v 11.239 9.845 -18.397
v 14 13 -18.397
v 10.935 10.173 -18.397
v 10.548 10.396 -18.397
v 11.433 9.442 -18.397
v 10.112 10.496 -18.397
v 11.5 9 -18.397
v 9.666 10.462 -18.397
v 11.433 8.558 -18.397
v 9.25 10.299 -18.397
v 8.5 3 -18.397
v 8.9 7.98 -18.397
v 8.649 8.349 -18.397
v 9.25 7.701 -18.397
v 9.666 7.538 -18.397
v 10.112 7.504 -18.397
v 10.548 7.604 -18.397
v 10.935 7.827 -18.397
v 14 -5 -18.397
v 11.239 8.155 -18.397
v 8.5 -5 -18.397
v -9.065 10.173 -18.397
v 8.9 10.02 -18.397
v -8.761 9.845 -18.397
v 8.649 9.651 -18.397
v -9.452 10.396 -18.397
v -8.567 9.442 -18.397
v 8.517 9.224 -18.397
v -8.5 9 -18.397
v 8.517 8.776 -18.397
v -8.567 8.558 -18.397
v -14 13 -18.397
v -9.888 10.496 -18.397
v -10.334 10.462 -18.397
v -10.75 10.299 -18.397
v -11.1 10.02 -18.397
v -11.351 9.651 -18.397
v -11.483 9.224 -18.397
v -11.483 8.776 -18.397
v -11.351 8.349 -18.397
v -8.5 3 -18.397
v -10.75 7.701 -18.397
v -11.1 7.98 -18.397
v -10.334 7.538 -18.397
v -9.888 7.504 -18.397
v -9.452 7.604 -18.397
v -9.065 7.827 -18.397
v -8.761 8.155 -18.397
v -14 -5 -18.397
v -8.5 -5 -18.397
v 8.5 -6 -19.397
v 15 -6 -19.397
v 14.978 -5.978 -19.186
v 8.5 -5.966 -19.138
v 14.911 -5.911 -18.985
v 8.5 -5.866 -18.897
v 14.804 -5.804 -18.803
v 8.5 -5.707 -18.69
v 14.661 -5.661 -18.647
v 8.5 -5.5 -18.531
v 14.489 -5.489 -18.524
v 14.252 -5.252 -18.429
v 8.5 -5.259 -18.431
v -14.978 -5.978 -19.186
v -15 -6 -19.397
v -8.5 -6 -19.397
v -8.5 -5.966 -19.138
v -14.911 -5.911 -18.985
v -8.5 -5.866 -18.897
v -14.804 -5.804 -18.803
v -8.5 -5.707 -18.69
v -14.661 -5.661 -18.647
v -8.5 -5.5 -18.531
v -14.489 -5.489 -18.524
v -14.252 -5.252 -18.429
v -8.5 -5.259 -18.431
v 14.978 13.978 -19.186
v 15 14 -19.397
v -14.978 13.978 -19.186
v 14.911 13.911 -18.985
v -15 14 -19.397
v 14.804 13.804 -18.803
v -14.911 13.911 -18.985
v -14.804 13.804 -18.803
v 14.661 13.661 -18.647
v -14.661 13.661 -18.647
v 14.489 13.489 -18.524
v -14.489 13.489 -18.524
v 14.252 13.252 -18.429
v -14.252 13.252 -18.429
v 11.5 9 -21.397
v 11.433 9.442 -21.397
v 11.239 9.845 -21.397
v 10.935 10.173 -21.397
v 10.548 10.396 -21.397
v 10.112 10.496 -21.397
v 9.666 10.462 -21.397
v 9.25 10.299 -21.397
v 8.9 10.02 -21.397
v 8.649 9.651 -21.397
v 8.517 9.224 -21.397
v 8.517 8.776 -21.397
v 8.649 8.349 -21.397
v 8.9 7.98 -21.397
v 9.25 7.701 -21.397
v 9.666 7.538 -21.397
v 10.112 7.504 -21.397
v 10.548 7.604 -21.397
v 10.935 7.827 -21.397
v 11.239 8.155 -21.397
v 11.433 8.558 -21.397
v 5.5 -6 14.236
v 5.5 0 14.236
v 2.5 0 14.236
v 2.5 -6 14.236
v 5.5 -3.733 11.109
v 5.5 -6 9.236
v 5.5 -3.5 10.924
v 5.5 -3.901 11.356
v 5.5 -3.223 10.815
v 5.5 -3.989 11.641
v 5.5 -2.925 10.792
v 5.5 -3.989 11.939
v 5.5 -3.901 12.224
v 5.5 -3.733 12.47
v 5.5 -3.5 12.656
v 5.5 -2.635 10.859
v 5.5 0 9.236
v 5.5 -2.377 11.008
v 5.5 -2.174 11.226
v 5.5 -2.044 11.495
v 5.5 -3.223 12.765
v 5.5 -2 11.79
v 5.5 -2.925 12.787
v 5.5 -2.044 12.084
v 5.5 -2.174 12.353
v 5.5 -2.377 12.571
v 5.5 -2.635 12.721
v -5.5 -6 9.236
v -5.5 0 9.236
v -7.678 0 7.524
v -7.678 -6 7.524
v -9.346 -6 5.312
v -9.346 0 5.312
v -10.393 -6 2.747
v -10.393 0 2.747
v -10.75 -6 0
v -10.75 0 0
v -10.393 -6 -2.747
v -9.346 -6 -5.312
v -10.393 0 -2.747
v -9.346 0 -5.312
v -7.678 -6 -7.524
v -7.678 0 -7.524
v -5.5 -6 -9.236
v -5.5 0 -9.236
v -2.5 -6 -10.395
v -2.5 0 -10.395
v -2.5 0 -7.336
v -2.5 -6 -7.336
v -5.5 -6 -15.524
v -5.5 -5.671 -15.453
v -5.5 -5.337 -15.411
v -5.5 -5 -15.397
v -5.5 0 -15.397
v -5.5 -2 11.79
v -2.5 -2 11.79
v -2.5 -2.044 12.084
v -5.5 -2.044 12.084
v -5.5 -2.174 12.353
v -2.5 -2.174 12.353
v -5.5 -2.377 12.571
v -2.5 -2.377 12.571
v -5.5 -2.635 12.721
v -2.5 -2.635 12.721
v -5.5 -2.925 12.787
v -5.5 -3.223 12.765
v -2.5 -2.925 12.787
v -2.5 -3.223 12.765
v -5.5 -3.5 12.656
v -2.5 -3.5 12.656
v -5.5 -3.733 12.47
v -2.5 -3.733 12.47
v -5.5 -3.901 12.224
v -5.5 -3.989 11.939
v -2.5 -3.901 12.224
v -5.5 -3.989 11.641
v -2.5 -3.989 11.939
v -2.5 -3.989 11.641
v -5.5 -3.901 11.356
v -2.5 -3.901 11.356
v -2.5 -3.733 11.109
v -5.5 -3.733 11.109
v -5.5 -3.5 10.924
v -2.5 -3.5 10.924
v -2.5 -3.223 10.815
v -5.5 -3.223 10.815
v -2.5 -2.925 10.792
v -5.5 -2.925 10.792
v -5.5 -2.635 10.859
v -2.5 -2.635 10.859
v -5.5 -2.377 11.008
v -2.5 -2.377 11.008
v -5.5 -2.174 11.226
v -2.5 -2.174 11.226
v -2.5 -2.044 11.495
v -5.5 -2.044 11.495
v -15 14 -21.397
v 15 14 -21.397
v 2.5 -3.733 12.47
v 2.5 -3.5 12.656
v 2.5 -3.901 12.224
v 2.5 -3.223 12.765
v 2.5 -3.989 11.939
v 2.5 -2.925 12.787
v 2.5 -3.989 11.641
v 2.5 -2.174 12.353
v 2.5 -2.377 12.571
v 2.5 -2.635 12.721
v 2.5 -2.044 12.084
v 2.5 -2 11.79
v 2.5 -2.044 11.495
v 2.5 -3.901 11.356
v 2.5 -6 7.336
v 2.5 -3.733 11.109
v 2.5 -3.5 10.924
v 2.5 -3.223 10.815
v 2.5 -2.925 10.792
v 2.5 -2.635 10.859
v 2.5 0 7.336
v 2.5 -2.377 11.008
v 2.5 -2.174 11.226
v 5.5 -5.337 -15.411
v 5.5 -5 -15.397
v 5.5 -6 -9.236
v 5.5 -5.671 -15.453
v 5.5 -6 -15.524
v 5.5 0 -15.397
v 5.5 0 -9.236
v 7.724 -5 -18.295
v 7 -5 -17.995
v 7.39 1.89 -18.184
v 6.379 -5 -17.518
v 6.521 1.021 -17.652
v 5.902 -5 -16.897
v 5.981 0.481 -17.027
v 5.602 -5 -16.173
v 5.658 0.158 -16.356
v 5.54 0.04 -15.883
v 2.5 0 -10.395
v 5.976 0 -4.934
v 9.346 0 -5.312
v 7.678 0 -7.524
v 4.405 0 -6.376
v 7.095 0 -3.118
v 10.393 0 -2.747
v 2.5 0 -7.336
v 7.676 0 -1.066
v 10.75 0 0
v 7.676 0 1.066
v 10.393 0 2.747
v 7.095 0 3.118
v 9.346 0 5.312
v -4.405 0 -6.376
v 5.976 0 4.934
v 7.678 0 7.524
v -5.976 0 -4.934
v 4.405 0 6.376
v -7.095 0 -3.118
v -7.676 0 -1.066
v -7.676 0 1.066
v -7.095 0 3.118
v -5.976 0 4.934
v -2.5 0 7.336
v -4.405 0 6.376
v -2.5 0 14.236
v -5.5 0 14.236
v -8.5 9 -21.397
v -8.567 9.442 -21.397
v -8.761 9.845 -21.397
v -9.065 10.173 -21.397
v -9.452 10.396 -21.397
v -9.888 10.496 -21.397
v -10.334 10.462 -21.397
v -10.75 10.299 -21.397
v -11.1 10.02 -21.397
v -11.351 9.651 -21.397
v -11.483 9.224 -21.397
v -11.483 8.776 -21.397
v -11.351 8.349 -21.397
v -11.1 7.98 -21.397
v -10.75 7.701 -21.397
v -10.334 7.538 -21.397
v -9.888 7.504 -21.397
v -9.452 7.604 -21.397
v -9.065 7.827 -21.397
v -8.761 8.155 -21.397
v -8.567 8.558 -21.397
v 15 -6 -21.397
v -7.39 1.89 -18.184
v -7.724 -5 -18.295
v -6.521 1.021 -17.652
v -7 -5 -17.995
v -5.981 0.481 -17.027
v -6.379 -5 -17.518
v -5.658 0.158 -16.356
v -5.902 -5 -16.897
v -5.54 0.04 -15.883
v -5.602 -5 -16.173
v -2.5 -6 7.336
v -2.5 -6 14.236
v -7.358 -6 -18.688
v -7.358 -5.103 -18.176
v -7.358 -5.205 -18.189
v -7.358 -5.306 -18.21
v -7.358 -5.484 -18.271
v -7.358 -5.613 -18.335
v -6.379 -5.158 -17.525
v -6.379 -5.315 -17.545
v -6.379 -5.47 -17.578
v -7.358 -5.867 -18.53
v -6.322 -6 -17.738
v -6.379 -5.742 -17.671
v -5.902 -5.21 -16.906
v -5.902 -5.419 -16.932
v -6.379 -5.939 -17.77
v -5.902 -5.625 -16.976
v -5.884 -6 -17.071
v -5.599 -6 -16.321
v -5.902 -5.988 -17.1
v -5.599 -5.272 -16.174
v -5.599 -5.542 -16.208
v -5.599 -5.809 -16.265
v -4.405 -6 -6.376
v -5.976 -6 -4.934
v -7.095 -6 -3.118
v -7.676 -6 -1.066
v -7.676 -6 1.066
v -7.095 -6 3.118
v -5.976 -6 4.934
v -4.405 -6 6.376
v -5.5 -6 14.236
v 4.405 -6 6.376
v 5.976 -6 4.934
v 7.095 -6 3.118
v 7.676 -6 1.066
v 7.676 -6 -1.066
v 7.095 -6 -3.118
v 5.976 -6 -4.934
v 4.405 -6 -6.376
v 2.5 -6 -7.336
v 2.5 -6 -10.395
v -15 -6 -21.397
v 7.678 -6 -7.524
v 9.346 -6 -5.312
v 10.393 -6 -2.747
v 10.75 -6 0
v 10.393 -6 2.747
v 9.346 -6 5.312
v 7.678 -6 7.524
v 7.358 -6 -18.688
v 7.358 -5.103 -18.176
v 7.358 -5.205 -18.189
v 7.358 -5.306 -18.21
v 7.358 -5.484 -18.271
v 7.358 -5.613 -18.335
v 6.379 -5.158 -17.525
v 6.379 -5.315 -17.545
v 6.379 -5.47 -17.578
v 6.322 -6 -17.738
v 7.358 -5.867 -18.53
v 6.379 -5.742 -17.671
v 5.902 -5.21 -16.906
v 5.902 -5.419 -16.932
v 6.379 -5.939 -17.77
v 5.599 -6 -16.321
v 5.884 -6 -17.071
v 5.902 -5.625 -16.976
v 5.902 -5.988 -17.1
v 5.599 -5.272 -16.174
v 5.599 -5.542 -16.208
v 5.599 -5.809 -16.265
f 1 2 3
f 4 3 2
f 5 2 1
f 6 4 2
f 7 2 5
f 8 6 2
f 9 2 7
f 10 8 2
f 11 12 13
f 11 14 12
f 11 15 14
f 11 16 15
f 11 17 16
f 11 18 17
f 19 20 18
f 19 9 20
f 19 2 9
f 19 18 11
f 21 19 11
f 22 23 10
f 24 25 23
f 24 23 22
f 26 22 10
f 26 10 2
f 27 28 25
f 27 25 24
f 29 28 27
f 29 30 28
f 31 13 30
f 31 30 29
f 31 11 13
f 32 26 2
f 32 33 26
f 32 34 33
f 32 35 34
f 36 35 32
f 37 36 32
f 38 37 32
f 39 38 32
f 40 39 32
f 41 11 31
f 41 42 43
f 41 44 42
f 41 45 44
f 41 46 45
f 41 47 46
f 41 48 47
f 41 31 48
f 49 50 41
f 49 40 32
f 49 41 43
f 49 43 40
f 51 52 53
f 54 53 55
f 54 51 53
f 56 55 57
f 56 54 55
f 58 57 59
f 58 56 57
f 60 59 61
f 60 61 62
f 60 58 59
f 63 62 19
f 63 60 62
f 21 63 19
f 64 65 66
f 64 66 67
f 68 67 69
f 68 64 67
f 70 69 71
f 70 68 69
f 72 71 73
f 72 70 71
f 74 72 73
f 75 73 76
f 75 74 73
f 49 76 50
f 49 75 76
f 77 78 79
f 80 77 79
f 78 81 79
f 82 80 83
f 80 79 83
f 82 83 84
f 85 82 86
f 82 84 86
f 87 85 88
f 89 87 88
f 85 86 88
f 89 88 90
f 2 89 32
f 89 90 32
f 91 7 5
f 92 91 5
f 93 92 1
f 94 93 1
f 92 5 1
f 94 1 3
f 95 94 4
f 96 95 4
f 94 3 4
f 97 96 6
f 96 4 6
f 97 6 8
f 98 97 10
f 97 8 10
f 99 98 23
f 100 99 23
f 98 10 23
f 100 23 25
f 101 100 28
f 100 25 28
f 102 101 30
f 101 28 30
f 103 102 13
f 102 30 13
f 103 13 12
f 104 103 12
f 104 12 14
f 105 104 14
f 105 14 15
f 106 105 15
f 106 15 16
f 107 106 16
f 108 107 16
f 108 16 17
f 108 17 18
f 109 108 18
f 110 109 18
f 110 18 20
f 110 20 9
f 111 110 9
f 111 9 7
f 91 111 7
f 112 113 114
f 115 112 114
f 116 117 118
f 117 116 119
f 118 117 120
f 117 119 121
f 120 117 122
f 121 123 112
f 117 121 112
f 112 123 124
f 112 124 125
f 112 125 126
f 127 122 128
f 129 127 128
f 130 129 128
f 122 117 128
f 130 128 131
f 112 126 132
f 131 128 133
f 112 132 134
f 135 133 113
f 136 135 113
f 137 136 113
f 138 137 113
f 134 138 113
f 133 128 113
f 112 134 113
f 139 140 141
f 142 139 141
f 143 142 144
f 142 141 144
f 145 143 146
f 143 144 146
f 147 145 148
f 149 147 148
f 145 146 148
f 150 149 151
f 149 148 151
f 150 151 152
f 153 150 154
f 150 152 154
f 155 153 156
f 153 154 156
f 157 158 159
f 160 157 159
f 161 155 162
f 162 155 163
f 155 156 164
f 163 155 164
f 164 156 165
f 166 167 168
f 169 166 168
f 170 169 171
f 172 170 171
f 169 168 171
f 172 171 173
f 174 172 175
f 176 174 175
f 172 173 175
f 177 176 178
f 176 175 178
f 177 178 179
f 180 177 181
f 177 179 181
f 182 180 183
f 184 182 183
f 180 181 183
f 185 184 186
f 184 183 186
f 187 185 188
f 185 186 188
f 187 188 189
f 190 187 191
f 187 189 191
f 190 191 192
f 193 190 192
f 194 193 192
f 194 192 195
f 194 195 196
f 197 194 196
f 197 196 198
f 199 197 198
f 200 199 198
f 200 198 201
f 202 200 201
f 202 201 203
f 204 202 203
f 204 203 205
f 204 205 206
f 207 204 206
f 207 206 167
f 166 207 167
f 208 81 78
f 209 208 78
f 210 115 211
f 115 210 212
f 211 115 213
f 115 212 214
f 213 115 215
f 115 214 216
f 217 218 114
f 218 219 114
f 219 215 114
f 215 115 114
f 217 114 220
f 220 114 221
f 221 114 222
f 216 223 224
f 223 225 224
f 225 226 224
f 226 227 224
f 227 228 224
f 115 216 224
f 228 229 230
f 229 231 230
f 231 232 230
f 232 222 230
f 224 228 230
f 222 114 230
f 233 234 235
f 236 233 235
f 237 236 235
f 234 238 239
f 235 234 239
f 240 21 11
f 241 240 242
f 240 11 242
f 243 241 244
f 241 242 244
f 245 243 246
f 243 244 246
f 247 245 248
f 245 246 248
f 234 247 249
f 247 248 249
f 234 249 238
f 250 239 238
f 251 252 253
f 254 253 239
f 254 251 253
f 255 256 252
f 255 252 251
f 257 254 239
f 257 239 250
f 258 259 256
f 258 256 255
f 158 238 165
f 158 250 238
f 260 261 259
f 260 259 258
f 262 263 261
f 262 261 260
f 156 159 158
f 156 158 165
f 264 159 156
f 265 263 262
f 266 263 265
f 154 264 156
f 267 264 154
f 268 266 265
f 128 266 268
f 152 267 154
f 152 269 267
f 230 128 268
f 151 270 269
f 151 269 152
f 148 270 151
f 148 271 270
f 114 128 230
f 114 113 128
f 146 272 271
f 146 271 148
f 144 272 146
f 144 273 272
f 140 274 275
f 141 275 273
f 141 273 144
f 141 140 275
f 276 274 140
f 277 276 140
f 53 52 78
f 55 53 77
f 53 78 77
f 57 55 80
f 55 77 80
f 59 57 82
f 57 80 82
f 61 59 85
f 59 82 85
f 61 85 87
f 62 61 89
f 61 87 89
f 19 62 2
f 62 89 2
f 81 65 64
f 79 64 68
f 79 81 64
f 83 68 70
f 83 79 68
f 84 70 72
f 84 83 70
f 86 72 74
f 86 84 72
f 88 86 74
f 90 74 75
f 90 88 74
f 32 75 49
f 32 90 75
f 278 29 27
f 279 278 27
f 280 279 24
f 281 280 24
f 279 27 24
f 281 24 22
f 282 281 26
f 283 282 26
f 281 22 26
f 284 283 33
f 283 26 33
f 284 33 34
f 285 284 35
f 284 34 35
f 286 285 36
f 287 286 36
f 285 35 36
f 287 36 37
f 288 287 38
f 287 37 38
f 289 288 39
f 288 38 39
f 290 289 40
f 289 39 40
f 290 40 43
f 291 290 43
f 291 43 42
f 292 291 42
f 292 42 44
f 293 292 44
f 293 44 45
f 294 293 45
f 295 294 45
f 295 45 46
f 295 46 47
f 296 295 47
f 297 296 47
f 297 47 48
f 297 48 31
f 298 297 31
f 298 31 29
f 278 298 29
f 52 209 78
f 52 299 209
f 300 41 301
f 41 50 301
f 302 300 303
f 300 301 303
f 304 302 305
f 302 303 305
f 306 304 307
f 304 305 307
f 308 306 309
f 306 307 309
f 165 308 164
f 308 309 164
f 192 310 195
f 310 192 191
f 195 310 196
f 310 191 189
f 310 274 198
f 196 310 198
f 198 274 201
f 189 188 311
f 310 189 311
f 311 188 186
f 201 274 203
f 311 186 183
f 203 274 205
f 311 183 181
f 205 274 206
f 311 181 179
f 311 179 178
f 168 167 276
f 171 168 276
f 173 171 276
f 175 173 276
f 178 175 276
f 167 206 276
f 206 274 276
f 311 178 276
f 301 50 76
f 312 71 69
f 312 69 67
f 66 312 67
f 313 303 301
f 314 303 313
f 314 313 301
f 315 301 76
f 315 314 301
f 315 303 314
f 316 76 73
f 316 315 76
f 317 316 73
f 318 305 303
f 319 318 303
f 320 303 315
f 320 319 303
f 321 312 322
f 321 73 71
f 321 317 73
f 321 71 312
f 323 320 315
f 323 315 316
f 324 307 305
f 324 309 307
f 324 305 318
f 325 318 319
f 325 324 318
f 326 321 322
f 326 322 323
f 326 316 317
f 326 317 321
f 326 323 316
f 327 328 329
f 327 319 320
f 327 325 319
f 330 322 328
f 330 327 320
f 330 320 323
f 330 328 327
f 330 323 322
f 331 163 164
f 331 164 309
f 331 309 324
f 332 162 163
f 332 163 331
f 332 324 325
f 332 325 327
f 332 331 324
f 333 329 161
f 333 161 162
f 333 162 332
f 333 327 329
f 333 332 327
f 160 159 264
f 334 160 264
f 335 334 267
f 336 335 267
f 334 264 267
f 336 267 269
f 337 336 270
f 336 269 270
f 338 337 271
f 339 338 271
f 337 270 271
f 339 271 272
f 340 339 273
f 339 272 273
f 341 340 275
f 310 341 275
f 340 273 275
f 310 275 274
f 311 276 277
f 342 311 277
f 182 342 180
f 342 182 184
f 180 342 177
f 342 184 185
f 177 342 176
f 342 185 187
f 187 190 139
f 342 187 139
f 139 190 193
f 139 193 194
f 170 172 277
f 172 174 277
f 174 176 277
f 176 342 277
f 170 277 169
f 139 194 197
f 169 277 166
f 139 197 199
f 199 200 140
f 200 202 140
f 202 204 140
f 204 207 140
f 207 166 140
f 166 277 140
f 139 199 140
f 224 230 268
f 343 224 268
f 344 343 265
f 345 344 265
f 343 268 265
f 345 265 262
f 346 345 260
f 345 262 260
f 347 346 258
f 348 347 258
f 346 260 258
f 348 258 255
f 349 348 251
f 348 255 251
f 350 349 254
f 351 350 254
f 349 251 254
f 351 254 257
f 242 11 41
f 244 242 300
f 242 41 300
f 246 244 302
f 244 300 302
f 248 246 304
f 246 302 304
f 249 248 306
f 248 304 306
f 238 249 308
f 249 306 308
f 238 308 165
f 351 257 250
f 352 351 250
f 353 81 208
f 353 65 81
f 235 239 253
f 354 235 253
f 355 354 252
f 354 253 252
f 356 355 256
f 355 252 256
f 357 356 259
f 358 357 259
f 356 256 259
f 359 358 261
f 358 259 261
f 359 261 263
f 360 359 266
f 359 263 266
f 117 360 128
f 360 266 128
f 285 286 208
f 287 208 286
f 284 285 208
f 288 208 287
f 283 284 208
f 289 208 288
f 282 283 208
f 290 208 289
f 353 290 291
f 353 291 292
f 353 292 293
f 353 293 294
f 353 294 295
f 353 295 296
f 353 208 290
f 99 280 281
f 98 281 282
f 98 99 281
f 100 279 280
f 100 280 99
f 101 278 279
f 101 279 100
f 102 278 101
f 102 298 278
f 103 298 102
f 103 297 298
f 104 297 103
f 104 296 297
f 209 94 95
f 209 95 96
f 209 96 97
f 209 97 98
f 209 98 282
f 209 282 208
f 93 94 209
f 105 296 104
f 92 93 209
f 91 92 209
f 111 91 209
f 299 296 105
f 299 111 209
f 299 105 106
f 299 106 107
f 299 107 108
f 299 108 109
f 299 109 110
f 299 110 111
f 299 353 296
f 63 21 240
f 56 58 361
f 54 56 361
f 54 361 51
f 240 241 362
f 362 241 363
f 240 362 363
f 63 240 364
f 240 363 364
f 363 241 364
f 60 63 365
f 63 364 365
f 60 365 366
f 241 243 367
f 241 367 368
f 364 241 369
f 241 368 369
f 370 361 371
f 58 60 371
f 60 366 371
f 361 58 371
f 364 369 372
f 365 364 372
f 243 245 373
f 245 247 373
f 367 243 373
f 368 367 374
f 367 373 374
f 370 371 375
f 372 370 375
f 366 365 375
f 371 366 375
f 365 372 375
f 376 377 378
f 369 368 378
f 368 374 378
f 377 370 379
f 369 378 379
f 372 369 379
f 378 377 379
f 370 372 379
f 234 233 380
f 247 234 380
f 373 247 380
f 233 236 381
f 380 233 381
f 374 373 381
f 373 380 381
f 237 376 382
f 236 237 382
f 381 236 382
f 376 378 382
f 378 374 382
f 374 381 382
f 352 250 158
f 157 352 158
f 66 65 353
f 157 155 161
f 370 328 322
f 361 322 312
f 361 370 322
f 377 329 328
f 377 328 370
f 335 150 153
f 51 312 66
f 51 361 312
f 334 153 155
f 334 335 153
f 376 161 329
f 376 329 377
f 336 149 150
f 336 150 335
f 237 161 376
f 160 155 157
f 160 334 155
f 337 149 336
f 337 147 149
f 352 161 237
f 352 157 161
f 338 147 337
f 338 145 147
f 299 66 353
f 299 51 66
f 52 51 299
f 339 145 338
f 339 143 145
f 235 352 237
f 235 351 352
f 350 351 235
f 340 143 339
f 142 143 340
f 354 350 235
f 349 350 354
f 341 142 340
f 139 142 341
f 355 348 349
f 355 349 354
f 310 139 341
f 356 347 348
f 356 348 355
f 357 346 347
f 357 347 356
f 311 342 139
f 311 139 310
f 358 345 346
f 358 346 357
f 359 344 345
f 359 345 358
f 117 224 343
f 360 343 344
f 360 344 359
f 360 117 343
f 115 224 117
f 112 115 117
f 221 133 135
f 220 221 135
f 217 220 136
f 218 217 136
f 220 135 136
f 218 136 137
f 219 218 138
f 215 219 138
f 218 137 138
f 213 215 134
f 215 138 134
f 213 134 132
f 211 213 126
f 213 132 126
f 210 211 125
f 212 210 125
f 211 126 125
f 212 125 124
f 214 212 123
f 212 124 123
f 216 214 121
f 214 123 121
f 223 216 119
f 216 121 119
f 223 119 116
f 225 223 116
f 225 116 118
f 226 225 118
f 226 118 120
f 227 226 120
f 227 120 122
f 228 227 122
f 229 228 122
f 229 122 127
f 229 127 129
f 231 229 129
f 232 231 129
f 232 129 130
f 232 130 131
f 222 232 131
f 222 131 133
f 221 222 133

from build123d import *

# Parameters (mm, degrees)
F1_DEPTH      = 6
F2_R          = 1
F3_DEPTH      = 25
F5_DEPTH      = 6
F6_DEPTH      = 10
F11_R         = 1
F12_T1_DEPTH  = 5
F12_T3_DEPTH  = 11
F12_T8_ANGLE  = 359.64
F12_T14_ANGLE = 359.64
F12_T21_DEPTH = 12.5
F12_T25_DEPTH = 18.5
F12_T32_DEPTH = 18.5
F12_T36_DEPTH = 12.5
F13_R         = 1.5
F14_DEPTH     = 25


# Not quite as in the source:
# - a fillet or chamfer that OpenCascade refuses, or shapes differently, is made with other operations: its cross-section is extruded or revolved along the edge and cut away or added


with BuildPart() as f1:
    # F0 (on Front) → F1 (new body)
    with BuildSketch(Plane.XZ):
        with BuildLine():
            Line((2.5, -7.3357003756), (2.5, -18.4552618332))
            Line((2.5, -18.4552618332), (5.5, -18.4552618332))
            Line((5.5, -18.4552618332), (5.5, -9.236476601))
            ThreePointArc((5.5, -9.236476601), (10.75, 0), (5.5, 9.236476601))
            Line((5.5, 9.236476601), (5.5, 14.236476601))
            Line((5.5, 14.236476601), (2.5, 14.236476601))
            Line((2.5, 14.236476601), (2.5, 7.3357003756))
            ThreePointArc((2.5, 7.3357003756), (7.75, 0), (2.5, -7.3357003756))
        make_face()
    extrude(amount=F1_DEPTH)


with BuildPart() as f1b:
    # F0 (on Front) → F1, piece 2 (new body)
    with BuildSketch(Plane.XZ):
        with BuildLine():
            ThreePointArc((-2.5, -7.3357003756), (-7.75, 0), (-2.5, 7.3357003756))
            Line((-2.5, 7.3357003756), (-2.5, 14.236476601))
            Line((-2.5, 14.236476601), (-5.5, 14.236476601))
            Line((-5.5, 14.236476601), (-5.5, 9.236476601))
            ThreePointArc((-5.5, 9.236476601), (-10.75, 0), (-5.5, -9.236476601))
            Line((-5.5, -9.236476601), (-5.5, -18.4552618332))
            Line((-5.5, -18.4552618332), (-2.5, -18.4552618332))
            Line((-2.5, -18.4552618332), (-2.5, -7.3357003756))
        make_face()
    extrude(amount=F1_DEPTH)


with BuildPart() as f3_tool:
    # F2 (on face) → F3 (new body)
    with BuildSketch(Plane.YZ.offset(5.5)):
        with Locations((-3, 11.7896459997)):
            Circle(F2_R)
    extrude(amount=-F3_DEPTH)


with BuildPart() as f1_1:
    add(f1.part)

    # F3: cut by f3_tool
    add(f3_tool.part, mode=Mode.SUBTRACT)


with BuildPart() as f1b_1:
    add(f1b.part)

    # F3: cut by f3_tool
    add(f3_tool.part, mode=Mode.SUBTRACT)


with BuildPart() as f5:
    # F4 (on Front) → F5 (new body)
    with BuildSketch(Plane.XZ):
        Polygon((2.5, -12.8954811044), (-2.5, -12.8954811044), (-2.5, -18.4552618332), (-2.5, -20.8968445659), (2.5, -20.8968445659), (2.5, -18.4552618332), align=None)
    extrude(amount=F5_DEPTH)


with BuildPart() as f6:
    # F4 (on Front) → F6 (new body, symmetric)
    with BuildSketch(Plane.XZ):
        Polygon((2.5, -20.8968445659), (-2.5, -20.8968445659), (-15, -20.8968445659), (-15, -23.8968445659), (15, -23.8968445659), (15, -20.8968445659), align=None)
    extrude(amount=F6_DEPTH, both=True)


with BuildPart() as f6_1:
    # F7: moved
    add(f6.part.moved(Location((0, 0, 2.5))))


with BuildPart() as f5_1:
    # F7: moved
    add(f5.part.moved(Location((0, 0, 2.5))))


with BuildPart() as f6_2:
    # F8: moved
    add(f6_1.part.moved(Location((0, 4, 0))))


with BuildPart() as f5_2:
    add(f5_1.part)

    # F9: union F6
    add(f6_2.part)

    # F10: union F1, F1b
    add(f1_1.part)
    add(f1b_1.part)

    # F11
    f11_edges = [f5_2.edges().sort_by_distance(p)[0] for p in [
        (-10.25, -6, -18.396845),
        (10.25, -6, -18.396845),
        (15, 4, -18.396845),
        (0, 14, -18.396845),
        (-15, 4, -18.396845),
    ]]
    fillet(f11_edges, radius=F11_R)

    # F12: fillet of radius 3 on 7 edges, made by hand

    # F12_s2 → F12_t1 (join)
    with BuildSketch(Plane.XZ):
        with BuildLine():
            ThreePointArc((-8.5, -18.3968445659), (-6.3786796564, -17.5181649094), (-5.5, -15.3968445659))
            Line((-5.5, -15.3968445659), (-5.5, -18.3968445659))
            Line((-5.5, -18.3968445659), (-8.5, -18.3968445659))
        make_face()
        with BuildLine():
            ThreePointArc((8.5, -18.3968445659), (6.3786796564, -17.5181649094), (5.5, -15.3968445659))
            Line((5.5, -15.3968445659), (5.5, -18.3968445659))
            Line((5.5, -18.3968445659), (8.5, -18.3968445659))
        make_face()
    extrude(amount=F12_T1_DEPTH)

    # F12_s4 → F12_t3 (join)
    with BuildSketch(Plane.YZ.offset(-5.5)):
        with BuildLine():
            ThreePointArc((3, -18.3968445659), (0.8786796564, -17.5181649094), (0, -15.3968445659))
            Line((0, -15.3968445659), (0, -18.3968445659))
            Line((0, -18.3968445659), (3, -18.3968445659))
        make_face()
    extrude(amount=F12_T3_DEPTH)


with BuildPart() as f12_tool6:
    # F12_s7 → F12_t8 (revolve)
    with BuildSketch(Plane.XZ.offset(5)):
        with BuildLine():
            ThreePointArc((-8.5, -18.3968445659), (-6.3786796564, -17.5181649094), (-5.5, -15.3968445659))
            Line((-5.5, -15.3968445659), (-5.5, -18.3968445659))
            Line((-5.5, -18.3968445659), (-8.5, -18.3968445659))
        make_face()
    revolve(axis=Axis((-5.5, -5, -19.3968445659), (1, 0, 0)), revolution_arc=F12_T8_ANGLE)

    split(bisect_by=Plane.XZ.offset(6), keep=Keep.BOTTOM)

    split(bisect_by=Plane.XY.offset(-21.3968445659), keep=Keep.TOP)


with BuildPart() as f5_3:
    add(f5_2.part)

    # F12_t5: union F12_tool6
    add(f12_tool6.part)


with BuildPart() as f12_tool12:
    # F12_s13 → F12_t14 (revolve)
    with BuildSketch(Plane.XZ.offset(5)):
        with BuildLine():
            ThreePointArc((8.5, -18.3968445659), (6.3786796564, -17.5181649094), (5.5, -15.3968445659))
            Line((5.5, -15.3968445659), (5.5, -18.3968445659))
            Line((5.5, -18.3968445659), (8.5, -18.3968445659))
        make_face()
    revolve(axis=Axis((5.5, -5, -19.3968445659), (1, 0, 0)), revolution_arc=F12_T14_ANGLE)

    split(bisect_by=Plane.XZ.offset(6), keep=Keep.BOTTOM)

    split(bisect_by=Plane.XY.offset(-21.3968445659), keep=Keep.TOP)


with BuildPart() as f5_4:
    add(f5_3.part)

    # F12_t11: union F12_tool12
    add(f12_tool12.part)


with BuildPart() as f12_tool19:
    # F12_s20 → F12_t21 (new body)
    with BuildSketch(Plane.XZ.offset(5)):
        with BuildLine():
            ThreePointArc((-8.5, -18.3968445659), (-6.3786796564, -17.5181649094), (-5.5, -15.3968445659))
            Line((-5.5, -15.3968445659), (-5.5, -18.3968445659))
            Line((-5.5, -18.3968445659), (-8.5, -18.3968445659))
        make_face()
    extrude(amount=-F12_T21_DEPTH)

    split(bisect_by=Plane.XZ, keep=Keep.BOTTOM)


with BuildPart() as f12_tool23:
    # F12_s24 → F12_t25 (new body)
    with BuildSketch(Plane.YZ.offset(-13)):
        with BuildLine():
            ThreePointArc((3, -18.3968445659), (0.8786796564, -17.5181649094), (0, -15.3968445659))
            Line((0, -15.3968445659), (0, -18.3968445659))
            Line((0, -18.3968445659), (3, -18.3968445659))
        make_face()
    extrude(amount=F12_T25_DEPTH)

    split(bisect_by=Plane.YZ.offset(-5.5), keep=Keep.BOTTOM)


with BuildPart() as f12_tool19_1:
    add(f12_tool19.part)

    # F12_t27: intersect F12_tool23
    add(f12_tool23.part, mode=Mode.INTERSECT)


with BuildPart() as f5_5:
    add(f5_4.part)

    # F12_t17: union F12_tool19
    add(f12_tool19_1.part)


with BuildPart() as f12_tool30:
    # F12_s31 → F12_t32 (new body)
    with BuildSketch(Plane.YZ.offset(-5.5)):
        with BuildLine():
            ThreePointArc((3, -18.3968445659), (0.8786796564, -17.5181649094), (0, -15.3968445659))
            Line((0, -15.3968445659), (0, -18.3968445659))
            Line((0, -18.3968445659), (3, -18.3968445659))
        make_face()
    extrude(amount=F12_T32_DEPTH)

    split(bisect_by=Plane.YZ.offset(5.5), keep=Keep.TOP)


with BuildPart() as f12_tool34:
    # F12_s35 → F12_t36 (new body)
    with BuildSketch(Plane.XZ.offset(-7.5)):
        with BuildLine():
            ThreePointArc((8.5, -18.3968445659), (6.3786796564, -17.5181649094), (5.5, -15.3968445659))
            Line((5.5, -15.3968445659), (5.5, -18.3968445659))
            Line((5.5, -18.3968445659), (8.5, -18.3968445659))
        make_face()
    extrude(amount=F12_T36_DEPTH)

    split(bisect_by=Plane.XZ, keep=Keep.BOTTOM)


with BuildPart() as f12_tool30_1:
    add(f12_tool30.part)

    # F12_t38: intersect F12_tool34
    add(f12_tool34.part, mode=Mode.INTERSECT)


with BuildPart() as f5_6:
    add(f5_5.part)

    # F12_t28: union F12_tool30
    add(f12_tool30_1.part)

    # F13 (on face) → F14 (cut)
    with BuildSketch(Plane.XY.offset(-18.3968445659)):
        with Locations((-10, 9)):
            Circle(F13_R)
        with Locations((10, 9)):
            Circle(F13_R)
    extrude(amount=-F14_DEPTH, mode=Mode.SUBTRACT)


solid = f5_6.part
